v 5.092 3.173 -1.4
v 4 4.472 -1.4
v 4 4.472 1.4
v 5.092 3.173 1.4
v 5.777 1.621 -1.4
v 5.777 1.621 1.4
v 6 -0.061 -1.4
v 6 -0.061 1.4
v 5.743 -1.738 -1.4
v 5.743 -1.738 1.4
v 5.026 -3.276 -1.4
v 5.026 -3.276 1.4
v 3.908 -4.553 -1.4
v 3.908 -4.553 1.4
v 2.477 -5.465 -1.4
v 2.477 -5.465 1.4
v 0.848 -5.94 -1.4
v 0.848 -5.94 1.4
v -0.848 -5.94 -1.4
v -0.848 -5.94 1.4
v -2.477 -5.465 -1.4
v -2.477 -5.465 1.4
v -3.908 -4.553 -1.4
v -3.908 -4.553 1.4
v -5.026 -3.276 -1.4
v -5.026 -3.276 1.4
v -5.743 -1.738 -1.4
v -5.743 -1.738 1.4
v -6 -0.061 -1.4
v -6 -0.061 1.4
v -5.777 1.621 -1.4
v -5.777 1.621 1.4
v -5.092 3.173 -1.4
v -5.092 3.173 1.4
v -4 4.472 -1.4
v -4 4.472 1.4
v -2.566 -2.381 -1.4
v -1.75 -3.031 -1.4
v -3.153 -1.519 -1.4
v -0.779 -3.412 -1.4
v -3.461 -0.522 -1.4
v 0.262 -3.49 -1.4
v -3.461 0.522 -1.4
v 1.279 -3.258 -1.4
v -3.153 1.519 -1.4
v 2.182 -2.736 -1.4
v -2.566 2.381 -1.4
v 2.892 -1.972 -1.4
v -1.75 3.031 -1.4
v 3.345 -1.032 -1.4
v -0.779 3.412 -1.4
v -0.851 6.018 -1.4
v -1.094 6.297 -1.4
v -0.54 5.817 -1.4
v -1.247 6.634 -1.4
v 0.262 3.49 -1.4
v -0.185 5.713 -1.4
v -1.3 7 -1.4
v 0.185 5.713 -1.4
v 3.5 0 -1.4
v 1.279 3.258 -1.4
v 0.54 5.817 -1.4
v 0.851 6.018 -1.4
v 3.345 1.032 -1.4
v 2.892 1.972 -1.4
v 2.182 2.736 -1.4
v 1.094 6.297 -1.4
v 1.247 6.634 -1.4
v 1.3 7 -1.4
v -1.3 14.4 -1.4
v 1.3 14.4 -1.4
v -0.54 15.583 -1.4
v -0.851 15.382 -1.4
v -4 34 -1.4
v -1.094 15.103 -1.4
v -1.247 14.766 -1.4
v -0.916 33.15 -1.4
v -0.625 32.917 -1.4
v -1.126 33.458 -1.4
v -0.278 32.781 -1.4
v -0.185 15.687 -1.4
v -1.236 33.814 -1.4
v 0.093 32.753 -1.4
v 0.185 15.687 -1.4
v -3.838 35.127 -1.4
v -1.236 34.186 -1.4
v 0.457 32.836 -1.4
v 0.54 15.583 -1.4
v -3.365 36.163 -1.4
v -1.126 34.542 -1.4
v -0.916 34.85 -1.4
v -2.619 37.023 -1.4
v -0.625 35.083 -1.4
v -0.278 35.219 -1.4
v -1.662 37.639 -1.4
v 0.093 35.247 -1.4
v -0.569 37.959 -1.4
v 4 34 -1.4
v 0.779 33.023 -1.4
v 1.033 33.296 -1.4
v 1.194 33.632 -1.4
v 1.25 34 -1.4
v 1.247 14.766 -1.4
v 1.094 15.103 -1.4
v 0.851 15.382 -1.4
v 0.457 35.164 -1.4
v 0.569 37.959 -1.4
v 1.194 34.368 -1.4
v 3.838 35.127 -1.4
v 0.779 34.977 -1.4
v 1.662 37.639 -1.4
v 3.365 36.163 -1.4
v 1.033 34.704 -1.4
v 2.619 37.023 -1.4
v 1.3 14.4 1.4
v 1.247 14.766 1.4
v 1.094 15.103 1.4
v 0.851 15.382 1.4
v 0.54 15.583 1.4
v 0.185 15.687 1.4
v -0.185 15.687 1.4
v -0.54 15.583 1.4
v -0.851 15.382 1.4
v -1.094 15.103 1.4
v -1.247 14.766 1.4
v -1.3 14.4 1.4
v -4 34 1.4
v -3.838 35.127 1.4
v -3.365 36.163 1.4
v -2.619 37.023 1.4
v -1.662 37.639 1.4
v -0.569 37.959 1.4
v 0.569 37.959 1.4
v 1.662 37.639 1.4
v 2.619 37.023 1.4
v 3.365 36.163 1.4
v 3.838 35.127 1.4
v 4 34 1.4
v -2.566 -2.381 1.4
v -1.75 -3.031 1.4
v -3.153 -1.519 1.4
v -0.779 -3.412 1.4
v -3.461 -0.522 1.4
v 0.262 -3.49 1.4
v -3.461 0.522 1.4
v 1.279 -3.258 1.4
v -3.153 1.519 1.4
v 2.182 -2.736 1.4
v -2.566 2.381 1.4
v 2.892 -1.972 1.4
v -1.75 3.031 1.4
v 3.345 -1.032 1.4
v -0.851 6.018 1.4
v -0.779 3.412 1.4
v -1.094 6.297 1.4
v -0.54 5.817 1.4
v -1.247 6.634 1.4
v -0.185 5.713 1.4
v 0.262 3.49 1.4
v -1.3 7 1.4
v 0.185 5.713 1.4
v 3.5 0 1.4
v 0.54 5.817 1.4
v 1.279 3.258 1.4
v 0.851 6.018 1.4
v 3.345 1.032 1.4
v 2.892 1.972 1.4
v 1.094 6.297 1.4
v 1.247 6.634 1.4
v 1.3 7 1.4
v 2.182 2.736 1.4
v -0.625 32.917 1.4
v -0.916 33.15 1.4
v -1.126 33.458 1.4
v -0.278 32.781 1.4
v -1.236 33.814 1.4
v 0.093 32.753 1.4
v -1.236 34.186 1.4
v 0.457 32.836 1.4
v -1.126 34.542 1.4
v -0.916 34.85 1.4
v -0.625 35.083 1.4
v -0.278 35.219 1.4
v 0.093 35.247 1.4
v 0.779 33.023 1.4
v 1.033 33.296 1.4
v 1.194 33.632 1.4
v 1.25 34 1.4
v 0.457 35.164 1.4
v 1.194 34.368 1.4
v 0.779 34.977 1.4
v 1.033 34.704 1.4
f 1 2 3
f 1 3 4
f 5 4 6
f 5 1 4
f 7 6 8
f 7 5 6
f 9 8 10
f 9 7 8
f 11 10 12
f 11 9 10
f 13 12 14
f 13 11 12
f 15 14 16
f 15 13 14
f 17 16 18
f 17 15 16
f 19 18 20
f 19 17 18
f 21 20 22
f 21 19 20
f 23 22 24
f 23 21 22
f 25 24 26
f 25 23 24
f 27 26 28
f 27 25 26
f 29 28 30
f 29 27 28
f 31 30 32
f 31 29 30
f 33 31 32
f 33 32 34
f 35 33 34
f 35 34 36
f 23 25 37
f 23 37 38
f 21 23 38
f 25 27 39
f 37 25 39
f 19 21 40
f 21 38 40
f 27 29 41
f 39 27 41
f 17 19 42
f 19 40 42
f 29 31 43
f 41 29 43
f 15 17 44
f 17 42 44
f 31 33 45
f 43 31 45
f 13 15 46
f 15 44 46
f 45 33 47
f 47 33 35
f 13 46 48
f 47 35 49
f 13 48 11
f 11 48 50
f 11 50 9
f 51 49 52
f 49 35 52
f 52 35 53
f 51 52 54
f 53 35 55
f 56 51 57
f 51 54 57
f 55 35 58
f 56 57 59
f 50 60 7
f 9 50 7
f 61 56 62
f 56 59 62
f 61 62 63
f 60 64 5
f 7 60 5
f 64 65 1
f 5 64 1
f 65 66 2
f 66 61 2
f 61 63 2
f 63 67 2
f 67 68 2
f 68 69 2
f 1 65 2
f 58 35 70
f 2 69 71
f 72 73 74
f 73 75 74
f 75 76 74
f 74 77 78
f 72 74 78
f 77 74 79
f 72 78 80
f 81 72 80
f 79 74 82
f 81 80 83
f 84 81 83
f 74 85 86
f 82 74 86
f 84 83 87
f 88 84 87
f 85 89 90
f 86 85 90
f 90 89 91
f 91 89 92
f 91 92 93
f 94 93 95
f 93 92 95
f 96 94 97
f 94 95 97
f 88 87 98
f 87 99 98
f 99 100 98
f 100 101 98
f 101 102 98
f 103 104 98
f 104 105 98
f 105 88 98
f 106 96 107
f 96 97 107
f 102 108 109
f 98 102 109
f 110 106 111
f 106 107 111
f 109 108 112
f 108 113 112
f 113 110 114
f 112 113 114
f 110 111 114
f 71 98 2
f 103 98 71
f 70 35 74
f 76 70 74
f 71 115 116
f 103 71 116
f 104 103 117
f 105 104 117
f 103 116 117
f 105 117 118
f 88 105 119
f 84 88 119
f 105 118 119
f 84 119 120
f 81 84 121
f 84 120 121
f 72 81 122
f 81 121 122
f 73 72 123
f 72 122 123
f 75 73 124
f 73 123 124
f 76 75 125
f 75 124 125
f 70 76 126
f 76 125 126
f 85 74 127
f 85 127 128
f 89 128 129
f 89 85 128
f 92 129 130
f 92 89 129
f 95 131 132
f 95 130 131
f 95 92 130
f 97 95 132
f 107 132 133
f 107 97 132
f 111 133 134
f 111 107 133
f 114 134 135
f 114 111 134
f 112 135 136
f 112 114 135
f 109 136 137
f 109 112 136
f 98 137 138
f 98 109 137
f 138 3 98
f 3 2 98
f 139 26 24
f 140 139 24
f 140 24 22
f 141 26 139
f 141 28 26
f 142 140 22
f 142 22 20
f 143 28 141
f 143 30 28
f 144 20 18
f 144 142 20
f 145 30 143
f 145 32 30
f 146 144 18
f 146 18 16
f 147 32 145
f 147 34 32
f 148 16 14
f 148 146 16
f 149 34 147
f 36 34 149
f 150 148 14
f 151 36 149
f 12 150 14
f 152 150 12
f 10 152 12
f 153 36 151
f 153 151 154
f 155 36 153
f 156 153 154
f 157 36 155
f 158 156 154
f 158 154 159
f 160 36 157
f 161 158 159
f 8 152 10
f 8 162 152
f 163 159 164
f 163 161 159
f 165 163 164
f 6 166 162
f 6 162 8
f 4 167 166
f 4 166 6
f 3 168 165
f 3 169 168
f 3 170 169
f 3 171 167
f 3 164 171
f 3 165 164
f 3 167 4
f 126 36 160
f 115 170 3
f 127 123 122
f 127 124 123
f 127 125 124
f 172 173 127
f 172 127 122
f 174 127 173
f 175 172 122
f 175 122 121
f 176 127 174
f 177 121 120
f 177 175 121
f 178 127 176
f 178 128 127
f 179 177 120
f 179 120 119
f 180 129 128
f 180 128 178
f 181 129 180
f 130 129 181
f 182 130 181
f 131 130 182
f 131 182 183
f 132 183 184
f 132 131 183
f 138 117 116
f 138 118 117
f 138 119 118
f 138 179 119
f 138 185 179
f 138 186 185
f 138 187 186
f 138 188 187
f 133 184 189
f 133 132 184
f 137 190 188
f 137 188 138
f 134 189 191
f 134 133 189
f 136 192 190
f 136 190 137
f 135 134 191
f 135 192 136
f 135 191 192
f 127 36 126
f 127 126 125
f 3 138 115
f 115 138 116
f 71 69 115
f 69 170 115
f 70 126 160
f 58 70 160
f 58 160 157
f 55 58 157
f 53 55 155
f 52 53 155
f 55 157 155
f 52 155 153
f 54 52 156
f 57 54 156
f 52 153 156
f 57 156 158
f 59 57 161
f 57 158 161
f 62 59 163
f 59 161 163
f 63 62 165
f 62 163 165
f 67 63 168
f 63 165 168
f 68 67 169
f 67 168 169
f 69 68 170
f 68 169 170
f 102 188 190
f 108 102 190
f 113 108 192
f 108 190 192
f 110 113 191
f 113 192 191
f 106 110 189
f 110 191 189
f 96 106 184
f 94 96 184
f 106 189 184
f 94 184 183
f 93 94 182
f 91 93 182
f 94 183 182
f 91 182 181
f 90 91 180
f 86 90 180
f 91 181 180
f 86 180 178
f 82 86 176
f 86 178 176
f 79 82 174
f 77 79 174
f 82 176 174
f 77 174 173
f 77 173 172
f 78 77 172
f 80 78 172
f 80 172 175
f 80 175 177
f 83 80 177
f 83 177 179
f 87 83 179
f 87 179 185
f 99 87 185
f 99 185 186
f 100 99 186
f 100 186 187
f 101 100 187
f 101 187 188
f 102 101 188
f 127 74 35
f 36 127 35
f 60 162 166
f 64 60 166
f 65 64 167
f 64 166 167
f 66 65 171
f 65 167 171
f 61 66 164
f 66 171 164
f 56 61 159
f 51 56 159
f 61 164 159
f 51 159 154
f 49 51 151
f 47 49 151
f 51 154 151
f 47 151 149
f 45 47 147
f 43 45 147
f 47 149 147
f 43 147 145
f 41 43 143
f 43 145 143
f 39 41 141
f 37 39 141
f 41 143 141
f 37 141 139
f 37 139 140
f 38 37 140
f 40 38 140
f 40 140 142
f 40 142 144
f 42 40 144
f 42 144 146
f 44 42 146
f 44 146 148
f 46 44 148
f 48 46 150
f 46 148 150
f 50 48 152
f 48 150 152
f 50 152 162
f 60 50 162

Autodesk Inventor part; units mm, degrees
ref_plane "YZ Plane" through (0, 0, 0) normal (1, 0, 0) x (0, 1, 0)
ref_plane "XZ Plane" through (0, 0, 0) normal (0, 1, 0) x (-1, 0, 0)
ref_plane "XY Plane" through (0, 0, 0) normal (0, 0, 1) x (1, 0, 0)
sketch "Sketch1" plane through (0, 0, 0) normal (0, 0, 1) x (1, 0, 0)
  circle A0 centre (0, 0) radius 6
  line L0 (0, 2) -> (0, 34) construction
  line L1 (4, 2) -> (4, 34)
  line L2 (-4, 34) -> (-4, 2)
  arc A1 (-4, 2) -> (4, 2) centre (0, 2) ccw
  arc A2 (4, 34) -> (-4, 34) centre (0, 34) ccw
  point P0 (0, 18)
  dimension "d0" = 12
  dimension "d1" = 8
  dimension "d2" = 34
extrude "Extrusion1" add sketch "Sketch1" along normal mid plane 2.8
sketch "Sketch2" plane through (0, 0, 1.4) normal (0, 0, 1) x (1, 0, 0)
  arc A0 (4, 34) -> (-4, 34) centre (0, 34) ccw construction
  arc A1 (-4, 4.4721) -> (4, 4.4721) centre (0, 0) ccw construction
  circle A2 centre (0, 0) radius 3.5
  circle A3 centre (0, 34) radius 1.25
  line L0 (0, 15.7) -> (0, 5.7) construction
  line L1 (-1.3, 14.4) -> (-1.3, 7)
  line L2 (1.3, 7) -> (1.3, 14.4)
  arc A4 (1.3, 14.4) -> (-1.3, 14.4) centre (0, 14.4) ccw
  arc A5 (-1.3, 7) -> (1.3, 7) centre (0, 7) ccw
  point P0 (0, 10.7)
  dimension "d5" = 10
  dimension "d6" = 2.6
  dimension "d7" = 7
  dimension "d8" = 2.5
  dimension "d9" = 7
extrude "Extrusion2" cut sketch "Sketch2" against normal through all
